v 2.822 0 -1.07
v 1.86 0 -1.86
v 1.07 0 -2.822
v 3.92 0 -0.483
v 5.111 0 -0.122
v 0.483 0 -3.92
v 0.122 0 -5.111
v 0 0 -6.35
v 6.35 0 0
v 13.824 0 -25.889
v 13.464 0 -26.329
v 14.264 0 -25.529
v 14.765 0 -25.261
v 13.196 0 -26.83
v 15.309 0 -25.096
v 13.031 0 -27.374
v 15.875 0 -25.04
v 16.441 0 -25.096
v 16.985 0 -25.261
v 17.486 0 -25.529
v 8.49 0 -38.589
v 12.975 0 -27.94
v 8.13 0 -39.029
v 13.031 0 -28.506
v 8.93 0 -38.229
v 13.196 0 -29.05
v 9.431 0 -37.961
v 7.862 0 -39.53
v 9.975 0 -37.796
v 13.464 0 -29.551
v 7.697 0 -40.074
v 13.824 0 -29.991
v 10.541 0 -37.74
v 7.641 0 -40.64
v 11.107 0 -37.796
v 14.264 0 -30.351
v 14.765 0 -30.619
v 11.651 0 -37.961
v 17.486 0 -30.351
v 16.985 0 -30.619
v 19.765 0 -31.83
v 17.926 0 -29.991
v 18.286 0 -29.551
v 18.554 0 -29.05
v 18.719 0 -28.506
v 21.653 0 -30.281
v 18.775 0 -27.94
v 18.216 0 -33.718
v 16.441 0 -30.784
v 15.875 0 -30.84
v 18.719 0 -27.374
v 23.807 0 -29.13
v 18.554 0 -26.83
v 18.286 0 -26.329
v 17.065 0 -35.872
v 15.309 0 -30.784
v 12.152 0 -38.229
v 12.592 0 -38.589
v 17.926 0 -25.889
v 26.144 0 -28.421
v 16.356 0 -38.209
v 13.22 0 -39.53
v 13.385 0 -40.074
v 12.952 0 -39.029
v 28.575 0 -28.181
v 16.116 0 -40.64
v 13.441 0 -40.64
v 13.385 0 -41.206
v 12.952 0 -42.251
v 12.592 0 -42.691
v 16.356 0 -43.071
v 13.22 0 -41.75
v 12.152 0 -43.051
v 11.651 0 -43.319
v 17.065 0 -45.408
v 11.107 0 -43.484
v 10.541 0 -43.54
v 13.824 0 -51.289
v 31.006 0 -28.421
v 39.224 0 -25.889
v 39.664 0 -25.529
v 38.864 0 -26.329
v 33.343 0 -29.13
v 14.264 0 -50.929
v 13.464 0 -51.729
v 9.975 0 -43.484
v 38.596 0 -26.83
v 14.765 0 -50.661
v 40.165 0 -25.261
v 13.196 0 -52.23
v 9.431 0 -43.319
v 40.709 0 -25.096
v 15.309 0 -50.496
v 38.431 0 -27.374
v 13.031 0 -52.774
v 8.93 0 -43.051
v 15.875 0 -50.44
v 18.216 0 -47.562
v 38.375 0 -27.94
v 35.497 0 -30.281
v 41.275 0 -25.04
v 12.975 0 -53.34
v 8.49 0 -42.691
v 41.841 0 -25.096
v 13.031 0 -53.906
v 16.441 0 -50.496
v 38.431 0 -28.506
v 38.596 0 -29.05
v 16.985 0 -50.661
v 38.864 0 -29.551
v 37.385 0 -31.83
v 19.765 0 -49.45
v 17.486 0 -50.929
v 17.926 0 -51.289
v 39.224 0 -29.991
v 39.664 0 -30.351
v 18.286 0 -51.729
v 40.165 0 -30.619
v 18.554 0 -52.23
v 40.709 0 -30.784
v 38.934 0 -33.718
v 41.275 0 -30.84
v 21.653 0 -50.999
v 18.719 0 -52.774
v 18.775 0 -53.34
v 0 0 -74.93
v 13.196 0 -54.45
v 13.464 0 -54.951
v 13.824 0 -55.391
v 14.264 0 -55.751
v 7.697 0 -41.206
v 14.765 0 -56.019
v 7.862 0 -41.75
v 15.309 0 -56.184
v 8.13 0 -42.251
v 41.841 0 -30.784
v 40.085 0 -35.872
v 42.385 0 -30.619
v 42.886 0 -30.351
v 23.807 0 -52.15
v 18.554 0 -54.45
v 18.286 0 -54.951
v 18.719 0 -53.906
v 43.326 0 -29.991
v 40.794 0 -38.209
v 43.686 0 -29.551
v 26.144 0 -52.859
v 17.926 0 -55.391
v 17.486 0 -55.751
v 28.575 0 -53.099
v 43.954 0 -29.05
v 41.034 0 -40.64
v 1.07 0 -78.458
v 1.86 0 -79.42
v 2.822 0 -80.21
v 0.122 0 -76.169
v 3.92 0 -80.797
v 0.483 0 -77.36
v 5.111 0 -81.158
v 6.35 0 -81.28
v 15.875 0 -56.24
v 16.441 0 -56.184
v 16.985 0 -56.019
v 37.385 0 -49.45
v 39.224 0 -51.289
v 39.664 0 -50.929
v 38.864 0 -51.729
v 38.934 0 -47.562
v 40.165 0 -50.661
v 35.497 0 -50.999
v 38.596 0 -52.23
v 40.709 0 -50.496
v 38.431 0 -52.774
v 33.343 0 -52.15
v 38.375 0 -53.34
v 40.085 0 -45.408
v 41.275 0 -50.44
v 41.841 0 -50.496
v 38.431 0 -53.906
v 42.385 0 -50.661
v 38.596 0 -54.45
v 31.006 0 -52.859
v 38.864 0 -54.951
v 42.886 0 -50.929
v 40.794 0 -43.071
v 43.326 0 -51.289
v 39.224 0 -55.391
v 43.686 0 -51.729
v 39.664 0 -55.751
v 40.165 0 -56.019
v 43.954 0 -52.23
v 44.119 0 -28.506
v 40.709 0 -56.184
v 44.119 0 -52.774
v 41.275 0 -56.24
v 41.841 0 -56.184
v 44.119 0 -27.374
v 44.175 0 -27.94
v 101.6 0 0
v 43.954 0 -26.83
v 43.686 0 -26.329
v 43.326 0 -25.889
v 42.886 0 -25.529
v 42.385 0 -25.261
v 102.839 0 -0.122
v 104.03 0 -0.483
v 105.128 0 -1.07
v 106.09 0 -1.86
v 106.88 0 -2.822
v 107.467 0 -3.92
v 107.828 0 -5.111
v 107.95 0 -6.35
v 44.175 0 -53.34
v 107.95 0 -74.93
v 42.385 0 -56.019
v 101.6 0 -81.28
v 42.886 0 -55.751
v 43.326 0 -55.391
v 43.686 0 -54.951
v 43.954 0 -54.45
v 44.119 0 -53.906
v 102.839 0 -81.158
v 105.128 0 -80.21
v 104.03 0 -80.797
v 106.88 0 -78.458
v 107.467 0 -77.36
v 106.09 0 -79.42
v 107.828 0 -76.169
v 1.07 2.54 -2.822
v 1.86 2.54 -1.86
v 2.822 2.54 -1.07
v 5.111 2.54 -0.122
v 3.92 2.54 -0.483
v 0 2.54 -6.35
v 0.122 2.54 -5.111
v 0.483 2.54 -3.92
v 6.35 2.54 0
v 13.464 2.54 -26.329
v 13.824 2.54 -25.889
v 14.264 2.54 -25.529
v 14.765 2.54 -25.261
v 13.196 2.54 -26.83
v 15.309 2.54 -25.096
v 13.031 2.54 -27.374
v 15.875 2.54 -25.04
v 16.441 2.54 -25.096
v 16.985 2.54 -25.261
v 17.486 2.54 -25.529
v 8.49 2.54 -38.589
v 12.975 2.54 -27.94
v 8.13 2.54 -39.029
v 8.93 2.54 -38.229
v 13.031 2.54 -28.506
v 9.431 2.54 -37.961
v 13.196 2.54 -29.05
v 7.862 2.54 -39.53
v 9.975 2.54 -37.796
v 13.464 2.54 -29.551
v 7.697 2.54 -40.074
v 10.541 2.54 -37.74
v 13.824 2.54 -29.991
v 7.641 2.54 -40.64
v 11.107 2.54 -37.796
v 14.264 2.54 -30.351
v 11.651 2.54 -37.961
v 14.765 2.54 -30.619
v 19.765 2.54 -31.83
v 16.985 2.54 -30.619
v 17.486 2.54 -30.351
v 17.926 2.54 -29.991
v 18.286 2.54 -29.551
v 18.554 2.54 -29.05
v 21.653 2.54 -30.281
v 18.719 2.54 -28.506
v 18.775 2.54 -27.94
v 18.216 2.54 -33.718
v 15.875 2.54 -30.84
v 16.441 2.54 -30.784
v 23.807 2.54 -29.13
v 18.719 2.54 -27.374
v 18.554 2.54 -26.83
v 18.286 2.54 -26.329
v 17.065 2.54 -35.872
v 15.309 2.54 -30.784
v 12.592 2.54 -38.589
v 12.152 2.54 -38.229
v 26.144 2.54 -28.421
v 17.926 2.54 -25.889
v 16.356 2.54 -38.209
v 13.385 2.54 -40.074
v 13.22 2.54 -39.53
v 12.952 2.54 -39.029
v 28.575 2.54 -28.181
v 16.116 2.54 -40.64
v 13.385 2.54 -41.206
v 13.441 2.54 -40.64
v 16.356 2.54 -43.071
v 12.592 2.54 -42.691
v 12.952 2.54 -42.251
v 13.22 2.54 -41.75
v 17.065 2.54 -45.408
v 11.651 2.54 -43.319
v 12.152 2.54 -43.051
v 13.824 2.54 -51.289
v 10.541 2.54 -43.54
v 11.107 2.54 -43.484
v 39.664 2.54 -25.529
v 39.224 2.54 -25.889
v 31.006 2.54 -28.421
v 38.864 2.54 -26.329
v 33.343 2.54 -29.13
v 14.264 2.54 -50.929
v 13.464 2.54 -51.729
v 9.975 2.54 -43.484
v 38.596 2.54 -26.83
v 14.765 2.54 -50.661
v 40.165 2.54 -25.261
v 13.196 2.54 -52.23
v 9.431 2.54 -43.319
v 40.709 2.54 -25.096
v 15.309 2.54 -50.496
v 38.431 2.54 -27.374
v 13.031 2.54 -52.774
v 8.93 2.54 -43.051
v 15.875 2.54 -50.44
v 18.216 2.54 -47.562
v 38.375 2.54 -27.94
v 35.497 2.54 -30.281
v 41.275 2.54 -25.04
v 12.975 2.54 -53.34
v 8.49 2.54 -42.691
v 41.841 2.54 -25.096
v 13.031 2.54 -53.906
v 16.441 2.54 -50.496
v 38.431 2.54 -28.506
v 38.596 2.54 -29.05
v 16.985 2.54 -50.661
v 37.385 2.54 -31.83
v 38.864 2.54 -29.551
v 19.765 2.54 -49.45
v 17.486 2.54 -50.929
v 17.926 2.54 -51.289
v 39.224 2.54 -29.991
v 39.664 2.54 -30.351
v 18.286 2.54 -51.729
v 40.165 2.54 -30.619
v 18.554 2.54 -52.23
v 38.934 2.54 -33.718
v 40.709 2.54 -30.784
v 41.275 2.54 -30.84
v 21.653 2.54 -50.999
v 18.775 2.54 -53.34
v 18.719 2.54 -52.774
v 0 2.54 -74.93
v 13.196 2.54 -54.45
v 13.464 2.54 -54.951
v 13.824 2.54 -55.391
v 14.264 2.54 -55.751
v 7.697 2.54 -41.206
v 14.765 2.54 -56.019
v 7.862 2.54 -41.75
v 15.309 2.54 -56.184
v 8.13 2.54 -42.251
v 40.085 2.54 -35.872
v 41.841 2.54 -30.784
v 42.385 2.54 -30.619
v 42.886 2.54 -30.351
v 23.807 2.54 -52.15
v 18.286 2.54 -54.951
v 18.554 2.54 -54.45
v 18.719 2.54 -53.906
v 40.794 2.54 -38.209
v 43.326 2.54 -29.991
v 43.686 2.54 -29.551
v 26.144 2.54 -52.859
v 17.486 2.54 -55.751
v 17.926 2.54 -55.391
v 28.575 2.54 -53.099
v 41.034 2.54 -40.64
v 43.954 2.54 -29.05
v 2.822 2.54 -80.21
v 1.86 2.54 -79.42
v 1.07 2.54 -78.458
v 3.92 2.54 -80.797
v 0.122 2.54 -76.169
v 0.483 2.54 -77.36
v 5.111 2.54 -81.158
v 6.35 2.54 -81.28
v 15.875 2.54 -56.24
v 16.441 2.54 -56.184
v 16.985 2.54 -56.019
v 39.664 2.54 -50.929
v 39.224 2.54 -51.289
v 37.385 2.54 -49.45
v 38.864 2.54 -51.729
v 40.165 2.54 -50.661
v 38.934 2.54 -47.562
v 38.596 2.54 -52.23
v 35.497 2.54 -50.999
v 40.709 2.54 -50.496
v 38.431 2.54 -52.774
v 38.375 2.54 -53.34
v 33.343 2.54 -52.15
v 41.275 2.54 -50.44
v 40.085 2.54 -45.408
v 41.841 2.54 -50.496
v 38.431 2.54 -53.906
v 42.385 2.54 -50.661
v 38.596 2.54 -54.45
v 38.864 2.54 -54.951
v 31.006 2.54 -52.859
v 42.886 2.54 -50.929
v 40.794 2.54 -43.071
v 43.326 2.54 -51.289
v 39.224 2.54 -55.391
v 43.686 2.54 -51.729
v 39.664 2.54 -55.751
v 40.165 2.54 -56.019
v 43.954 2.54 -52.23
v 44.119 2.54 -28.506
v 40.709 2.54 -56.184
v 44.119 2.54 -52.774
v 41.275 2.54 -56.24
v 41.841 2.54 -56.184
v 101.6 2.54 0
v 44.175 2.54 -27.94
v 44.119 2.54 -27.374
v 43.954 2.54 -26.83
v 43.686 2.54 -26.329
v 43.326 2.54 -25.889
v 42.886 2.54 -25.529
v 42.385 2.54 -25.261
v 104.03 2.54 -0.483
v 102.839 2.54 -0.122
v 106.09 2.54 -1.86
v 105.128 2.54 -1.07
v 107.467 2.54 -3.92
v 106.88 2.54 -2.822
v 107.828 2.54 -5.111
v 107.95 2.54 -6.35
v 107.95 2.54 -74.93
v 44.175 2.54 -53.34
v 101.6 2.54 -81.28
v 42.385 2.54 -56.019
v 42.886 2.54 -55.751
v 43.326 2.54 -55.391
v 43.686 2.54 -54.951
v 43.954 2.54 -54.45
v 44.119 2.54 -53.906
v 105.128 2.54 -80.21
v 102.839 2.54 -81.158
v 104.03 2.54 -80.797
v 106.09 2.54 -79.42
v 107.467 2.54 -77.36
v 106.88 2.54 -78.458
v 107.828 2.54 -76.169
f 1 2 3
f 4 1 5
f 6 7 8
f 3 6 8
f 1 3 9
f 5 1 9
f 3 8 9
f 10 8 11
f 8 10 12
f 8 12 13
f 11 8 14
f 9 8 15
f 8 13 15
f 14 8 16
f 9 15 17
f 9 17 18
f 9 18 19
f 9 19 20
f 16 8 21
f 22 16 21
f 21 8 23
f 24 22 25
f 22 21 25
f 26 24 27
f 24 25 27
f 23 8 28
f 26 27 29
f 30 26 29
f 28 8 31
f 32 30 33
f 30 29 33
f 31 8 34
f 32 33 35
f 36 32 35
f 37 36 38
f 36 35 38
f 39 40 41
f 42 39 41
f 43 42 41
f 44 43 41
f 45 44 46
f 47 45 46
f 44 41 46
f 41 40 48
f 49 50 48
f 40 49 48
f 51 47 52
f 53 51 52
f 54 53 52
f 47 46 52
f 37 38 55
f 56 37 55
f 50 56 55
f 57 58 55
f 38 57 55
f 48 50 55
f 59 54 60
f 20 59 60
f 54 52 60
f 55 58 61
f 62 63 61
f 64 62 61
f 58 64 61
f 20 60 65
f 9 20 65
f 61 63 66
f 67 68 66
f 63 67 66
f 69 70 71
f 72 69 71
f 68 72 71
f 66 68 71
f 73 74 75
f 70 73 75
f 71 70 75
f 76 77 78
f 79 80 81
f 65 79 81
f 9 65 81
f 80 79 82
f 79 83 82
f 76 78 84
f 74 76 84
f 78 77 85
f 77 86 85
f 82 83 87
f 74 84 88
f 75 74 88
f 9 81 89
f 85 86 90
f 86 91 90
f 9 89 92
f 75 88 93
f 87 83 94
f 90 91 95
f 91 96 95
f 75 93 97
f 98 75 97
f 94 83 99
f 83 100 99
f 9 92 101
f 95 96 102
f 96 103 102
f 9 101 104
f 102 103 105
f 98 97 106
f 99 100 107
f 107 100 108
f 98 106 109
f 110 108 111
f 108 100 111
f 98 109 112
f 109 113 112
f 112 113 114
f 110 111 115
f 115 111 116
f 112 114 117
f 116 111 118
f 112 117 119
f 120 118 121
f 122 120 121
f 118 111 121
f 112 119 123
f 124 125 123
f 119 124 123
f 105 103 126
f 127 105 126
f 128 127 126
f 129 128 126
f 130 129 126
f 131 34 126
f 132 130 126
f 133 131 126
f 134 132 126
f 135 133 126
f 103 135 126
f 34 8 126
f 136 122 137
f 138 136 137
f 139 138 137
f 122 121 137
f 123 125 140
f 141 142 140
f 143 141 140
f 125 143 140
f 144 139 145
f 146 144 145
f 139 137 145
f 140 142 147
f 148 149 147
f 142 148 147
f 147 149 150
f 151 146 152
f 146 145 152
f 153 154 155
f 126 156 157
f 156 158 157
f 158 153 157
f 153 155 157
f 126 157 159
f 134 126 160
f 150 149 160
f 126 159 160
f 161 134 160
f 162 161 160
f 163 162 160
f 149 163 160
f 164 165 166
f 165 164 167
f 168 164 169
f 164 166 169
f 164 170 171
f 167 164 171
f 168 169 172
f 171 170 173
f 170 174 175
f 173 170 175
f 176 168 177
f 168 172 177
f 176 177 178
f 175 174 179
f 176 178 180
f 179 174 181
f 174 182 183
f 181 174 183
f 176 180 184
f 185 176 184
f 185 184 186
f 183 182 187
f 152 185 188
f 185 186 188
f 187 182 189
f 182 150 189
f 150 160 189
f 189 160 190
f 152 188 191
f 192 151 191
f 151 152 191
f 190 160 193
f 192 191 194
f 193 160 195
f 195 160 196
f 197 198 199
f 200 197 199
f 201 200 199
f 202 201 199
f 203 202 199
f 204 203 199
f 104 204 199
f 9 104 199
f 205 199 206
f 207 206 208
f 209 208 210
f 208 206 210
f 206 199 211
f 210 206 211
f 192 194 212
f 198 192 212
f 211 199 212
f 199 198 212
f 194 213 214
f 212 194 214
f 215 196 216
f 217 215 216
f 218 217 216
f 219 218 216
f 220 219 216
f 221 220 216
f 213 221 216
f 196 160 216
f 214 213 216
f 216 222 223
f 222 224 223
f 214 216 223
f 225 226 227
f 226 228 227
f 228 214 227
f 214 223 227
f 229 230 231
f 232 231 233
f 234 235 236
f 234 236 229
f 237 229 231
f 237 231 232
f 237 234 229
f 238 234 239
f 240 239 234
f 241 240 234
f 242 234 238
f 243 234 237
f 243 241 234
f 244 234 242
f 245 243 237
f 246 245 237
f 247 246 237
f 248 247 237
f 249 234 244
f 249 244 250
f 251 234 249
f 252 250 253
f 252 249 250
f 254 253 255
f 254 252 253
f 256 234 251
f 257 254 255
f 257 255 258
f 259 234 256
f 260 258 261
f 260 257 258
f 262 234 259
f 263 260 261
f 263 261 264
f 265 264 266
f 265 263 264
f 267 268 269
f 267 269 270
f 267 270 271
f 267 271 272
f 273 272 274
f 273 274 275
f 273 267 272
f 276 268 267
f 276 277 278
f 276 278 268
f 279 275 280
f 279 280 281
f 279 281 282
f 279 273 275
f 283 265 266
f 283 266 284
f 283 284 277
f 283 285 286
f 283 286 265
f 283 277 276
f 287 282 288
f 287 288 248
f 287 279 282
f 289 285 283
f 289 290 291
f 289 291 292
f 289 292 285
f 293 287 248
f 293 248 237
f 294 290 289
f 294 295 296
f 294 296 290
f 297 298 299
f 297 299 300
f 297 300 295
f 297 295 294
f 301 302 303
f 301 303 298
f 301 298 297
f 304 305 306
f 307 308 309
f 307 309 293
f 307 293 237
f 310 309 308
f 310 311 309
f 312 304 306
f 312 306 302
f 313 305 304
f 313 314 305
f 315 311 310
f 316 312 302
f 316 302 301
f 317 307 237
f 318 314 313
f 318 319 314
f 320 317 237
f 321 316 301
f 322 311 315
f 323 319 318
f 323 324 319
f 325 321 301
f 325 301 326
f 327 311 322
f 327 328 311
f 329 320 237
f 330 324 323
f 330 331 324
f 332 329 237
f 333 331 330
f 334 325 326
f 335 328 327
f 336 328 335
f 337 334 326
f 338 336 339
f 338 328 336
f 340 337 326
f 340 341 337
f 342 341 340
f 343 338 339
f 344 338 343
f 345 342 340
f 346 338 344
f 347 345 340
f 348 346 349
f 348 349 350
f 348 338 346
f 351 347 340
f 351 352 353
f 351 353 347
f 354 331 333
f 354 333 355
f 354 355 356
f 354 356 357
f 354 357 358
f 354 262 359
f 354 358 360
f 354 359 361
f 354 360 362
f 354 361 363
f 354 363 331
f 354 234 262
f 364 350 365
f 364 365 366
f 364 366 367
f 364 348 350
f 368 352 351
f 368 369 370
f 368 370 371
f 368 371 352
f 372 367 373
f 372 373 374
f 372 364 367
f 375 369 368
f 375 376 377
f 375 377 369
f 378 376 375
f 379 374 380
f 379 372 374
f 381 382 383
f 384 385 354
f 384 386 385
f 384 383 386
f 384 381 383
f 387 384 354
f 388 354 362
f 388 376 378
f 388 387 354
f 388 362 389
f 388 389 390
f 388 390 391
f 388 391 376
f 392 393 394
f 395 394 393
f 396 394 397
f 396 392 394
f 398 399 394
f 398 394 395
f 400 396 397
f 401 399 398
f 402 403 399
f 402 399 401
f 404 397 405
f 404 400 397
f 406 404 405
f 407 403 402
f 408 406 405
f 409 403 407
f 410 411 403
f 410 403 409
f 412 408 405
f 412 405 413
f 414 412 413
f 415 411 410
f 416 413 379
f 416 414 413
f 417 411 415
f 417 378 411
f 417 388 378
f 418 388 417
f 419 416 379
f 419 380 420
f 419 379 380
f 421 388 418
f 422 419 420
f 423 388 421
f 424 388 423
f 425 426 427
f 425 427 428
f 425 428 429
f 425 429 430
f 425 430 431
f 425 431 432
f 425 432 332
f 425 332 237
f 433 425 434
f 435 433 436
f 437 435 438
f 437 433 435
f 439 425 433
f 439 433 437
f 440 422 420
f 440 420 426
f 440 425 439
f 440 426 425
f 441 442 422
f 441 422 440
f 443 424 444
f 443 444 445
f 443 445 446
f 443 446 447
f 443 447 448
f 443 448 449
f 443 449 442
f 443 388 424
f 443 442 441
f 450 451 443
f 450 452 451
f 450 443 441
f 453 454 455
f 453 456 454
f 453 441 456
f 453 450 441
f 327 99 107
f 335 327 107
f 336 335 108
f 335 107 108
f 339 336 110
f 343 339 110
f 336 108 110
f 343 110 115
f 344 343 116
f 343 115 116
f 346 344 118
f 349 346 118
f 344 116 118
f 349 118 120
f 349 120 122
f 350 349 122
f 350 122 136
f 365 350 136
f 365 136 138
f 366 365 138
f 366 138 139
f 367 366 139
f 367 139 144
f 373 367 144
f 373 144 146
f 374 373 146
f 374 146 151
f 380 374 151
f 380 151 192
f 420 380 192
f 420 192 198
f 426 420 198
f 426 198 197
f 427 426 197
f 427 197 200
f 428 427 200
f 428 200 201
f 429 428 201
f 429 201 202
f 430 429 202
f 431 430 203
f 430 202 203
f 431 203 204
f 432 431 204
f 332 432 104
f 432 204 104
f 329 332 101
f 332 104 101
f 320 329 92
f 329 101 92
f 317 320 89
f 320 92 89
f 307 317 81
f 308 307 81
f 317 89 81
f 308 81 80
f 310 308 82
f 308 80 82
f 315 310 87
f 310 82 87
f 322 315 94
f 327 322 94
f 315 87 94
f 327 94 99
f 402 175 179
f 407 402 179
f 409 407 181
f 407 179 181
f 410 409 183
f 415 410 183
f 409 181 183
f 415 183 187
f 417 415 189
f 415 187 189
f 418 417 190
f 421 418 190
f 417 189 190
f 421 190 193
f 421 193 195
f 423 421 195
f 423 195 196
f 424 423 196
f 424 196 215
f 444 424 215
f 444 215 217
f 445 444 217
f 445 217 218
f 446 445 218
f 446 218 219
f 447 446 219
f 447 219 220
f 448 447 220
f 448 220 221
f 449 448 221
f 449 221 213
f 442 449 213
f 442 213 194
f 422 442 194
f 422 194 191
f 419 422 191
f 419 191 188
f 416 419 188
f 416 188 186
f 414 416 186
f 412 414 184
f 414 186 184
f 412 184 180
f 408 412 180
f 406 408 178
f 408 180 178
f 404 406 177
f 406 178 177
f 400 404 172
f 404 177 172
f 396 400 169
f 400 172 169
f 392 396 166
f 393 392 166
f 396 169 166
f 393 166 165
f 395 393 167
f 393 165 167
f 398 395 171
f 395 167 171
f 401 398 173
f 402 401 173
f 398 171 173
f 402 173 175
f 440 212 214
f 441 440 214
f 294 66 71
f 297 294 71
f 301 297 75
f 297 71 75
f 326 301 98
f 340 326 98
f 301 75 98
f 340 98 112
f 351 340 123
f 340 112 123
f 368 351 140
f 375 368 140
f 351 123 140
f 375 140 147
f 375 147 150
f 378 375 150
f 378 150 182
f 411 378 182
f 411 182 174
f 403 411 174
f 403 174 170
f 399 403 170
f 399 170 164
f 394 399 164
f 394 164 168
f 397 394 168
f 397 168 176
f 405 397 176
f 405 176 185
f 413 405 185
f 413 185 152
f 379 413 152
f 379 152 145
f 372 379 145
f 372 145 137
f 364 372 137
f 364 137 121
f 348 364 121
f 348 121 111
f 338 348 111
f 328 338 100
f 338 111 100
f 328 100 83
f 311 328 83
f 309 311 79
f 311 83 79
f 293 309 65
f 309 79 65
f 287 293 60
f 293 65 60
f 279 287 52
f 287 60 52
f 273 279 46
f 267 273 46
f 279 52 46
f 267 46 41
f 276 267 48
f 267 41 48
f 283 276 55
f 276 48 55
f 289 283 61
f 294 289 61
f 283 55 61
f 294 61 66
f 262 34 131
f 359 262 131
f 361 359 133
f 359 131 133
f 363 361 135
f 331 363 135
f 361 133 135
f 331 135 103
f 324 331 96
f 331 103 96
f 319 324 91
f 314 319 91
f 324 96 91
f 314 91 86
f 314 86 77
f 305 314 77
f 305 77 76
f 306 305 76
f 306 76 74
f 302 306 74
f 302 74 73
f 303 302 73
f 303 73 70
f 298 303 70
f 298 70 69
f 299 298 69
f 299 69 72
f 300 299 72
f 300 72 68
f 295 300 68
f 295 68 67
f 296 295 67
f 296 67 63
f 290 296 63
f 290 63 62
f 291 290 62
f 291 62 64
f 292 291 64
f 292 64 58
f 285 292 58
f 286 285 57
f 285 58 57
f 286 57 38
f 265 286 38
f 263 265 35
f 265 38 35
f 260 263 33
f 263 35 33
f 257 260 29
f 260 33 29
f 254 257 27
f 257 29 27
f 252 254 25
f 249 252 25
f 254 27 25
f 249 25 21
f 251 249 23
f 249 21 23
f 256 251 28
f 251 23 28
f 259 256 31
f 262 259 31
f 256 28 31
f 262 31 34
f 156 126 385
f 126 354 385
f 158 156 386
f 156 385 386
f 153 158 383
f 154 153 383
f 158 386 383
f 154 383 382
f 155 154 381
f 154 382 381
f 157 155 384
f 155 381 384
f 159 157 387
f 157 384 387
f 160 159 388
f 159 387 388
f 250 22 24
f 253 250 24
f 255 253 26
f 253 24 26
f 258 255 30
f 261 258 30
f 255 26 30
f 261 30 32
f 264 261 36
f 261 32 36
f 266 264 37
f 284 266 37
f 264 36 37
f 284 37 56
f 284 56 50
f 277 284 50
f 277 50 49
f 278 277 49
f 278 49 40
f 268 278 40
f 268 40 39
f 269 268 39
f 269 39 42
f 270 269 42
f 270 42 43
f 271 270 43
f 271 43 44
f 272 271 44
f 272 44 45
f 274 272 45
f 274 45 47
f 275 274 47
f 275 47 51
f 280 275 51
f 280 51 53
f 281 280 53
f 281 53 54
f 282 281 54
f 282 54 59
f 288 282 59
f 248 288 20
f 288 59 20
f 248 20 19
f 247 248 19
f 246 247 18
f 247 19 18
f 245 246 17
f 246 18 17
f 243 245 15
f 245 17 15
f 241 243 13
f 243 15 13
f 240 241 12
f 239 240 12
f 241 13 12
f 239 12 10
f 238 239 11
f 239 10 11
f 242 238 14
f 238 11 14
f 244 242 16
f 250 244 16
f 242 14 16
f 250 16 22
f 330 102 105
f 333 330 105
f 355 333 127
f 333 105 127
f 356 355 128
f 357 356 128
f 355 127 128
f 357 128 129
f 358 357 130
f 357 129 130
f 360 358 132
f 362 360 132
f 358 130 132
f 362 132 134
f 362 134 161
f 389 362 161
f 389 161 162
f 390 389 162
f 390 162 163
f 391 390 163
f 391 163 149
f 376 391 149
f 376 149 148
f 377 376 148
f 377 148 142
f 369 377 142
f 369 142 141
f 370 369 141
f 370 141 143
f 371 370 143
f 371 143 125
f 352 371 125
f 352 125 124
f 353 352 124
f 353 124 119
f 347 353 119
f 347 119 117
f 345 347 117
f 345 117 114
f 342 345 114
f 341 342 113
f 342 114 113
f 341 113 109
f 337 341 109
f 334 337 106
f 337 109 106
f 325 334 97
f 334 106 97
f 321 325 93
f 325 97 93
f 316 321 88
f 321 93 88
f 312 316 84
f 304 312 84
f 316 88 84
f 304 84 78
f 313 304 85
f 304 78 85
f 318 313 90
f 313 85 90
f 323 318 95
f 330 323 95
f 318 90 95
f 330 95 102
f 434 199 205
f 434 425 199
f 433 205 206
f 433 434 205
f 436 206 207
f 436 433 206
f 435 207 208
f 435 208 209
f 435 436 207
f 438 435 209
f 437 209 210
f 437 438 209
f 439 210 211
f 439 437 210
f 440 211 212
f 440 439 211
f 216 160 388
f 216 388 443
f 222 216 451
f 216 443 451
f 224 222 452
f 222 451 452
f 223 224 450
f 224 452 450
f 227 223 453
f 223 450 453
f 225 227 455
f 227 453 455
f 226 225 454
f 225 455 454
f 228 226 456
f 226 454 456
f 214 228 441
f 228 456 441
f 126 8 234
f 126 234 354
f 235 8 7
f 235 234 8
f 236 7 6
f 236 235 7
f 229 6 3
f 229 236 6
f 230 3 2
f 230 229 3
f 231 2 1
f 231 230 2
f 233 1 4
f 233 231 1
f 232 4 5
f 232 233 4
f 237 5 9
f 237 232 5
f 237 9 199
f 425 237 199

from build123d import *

# Parameters (mm, degrees)
SKETCH1_W                   = 107.95
SKETCH1_H                   = 81.28
BOSS_EXTRUDE1_DEPTH         = 2.54
M5_CLEARANCE_HOLE1_D        = 5.8
F_97_0_981_DIAMETER_HOLE1_D = 24.9174
FILLET1_R                   = 6.35


with BuildPart() as part:
    # Sketch1 → Boss-Extrude1 (new body)
    with BuildSketch(Plane(origin=(0, 0, 0), x_dir=(1, 0, 0), z_dir=(0, 1, 0))):
        with Locations((53.975, 40.64)):
            Rectangle(SKETCH1_W, SKETCH1_H)
    extrude(amount=BOSS_EXTRUDE1_DEPTH)

    # M5 Clearance Hole1 (through all)
    with Locations(Plane(origin=(0, 2.54, 0), x_dir=(1, 0, 0), z_dir=(0, 1, 0))):
        with Locations((15.875, 53.34), (41.275, 53.34), (41.275, 27.94), (15.875, 27.94), (10.541, 40.64)):
            Hole(M5_CLEARANCE_HOLE1_D / 2)

    # #97 (0.981) Diameter Hole1 (through all)
    with Locations(Plane(origin=(0, 2.54, 0), x_dir=(1, 0, 0), z_dir=(0, 1, 0))):
        with Locations((28.575, 40.64)):
            Hole(F_97_0_981_DIAMETER_HOLE1_D / 2)

    # Fillet1
    fillet1_edges = [part.edges().sort_by_distance(p)[0] for p in [
        (0, 1.27, -81.28),
        (107.95, 1.27, -81.28),
        (107.95, 1.27, 0),
        (0, 1.27, 0),
    ]]
    fillet(fillet1_edges, radius=FILLET1_R)


solid = part.part
